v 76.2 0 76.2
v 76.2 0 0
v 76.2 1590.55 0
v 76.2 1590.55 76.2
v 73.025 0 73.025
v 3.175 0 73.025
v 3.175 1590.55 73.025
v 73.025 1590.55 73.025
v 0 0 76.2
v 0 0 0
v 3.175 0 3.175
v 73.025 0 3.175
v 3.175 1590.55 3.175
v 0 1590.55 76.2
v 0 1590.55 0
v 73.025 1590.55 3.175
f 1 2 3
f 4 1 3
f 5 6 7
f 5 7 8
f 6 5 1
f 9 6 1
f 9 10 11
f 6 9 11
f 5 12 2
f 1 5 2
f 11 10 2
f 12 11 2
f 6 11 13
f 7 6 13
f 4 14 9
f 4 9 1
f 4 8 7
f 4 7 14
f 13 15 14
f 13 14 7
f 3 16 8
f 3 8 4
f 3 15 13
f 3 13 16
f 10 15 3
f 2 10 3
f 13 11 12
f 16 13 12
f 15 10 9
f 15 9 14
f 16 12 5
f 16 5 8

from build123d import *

# Parameters (mm, degrees)
BOX_W       = 76.2
BOX_H       = 1590.55
BOX_DEPTH   = 76.2
THICKNESS_T = -3.175


with BuildPart() as part:
    # Box → Box (new body)
    with BuildSketch(Plane.XY):
        with Locations((38.1, 795.275)):
            Rectangle(BOX_W, BOX_H)
    extrude(amount=BOX_DEPTH)

    # Thickness
    thickness_openings = [part.faces().sort_by_distance(p)[0] for p in [
        (38.1, 0, 38.1),
        (38.1, 1590.55, 38.1),
    ]]
    offset(amount=THICKNESS_T, openings=thickness_openings)


solid = part.part
